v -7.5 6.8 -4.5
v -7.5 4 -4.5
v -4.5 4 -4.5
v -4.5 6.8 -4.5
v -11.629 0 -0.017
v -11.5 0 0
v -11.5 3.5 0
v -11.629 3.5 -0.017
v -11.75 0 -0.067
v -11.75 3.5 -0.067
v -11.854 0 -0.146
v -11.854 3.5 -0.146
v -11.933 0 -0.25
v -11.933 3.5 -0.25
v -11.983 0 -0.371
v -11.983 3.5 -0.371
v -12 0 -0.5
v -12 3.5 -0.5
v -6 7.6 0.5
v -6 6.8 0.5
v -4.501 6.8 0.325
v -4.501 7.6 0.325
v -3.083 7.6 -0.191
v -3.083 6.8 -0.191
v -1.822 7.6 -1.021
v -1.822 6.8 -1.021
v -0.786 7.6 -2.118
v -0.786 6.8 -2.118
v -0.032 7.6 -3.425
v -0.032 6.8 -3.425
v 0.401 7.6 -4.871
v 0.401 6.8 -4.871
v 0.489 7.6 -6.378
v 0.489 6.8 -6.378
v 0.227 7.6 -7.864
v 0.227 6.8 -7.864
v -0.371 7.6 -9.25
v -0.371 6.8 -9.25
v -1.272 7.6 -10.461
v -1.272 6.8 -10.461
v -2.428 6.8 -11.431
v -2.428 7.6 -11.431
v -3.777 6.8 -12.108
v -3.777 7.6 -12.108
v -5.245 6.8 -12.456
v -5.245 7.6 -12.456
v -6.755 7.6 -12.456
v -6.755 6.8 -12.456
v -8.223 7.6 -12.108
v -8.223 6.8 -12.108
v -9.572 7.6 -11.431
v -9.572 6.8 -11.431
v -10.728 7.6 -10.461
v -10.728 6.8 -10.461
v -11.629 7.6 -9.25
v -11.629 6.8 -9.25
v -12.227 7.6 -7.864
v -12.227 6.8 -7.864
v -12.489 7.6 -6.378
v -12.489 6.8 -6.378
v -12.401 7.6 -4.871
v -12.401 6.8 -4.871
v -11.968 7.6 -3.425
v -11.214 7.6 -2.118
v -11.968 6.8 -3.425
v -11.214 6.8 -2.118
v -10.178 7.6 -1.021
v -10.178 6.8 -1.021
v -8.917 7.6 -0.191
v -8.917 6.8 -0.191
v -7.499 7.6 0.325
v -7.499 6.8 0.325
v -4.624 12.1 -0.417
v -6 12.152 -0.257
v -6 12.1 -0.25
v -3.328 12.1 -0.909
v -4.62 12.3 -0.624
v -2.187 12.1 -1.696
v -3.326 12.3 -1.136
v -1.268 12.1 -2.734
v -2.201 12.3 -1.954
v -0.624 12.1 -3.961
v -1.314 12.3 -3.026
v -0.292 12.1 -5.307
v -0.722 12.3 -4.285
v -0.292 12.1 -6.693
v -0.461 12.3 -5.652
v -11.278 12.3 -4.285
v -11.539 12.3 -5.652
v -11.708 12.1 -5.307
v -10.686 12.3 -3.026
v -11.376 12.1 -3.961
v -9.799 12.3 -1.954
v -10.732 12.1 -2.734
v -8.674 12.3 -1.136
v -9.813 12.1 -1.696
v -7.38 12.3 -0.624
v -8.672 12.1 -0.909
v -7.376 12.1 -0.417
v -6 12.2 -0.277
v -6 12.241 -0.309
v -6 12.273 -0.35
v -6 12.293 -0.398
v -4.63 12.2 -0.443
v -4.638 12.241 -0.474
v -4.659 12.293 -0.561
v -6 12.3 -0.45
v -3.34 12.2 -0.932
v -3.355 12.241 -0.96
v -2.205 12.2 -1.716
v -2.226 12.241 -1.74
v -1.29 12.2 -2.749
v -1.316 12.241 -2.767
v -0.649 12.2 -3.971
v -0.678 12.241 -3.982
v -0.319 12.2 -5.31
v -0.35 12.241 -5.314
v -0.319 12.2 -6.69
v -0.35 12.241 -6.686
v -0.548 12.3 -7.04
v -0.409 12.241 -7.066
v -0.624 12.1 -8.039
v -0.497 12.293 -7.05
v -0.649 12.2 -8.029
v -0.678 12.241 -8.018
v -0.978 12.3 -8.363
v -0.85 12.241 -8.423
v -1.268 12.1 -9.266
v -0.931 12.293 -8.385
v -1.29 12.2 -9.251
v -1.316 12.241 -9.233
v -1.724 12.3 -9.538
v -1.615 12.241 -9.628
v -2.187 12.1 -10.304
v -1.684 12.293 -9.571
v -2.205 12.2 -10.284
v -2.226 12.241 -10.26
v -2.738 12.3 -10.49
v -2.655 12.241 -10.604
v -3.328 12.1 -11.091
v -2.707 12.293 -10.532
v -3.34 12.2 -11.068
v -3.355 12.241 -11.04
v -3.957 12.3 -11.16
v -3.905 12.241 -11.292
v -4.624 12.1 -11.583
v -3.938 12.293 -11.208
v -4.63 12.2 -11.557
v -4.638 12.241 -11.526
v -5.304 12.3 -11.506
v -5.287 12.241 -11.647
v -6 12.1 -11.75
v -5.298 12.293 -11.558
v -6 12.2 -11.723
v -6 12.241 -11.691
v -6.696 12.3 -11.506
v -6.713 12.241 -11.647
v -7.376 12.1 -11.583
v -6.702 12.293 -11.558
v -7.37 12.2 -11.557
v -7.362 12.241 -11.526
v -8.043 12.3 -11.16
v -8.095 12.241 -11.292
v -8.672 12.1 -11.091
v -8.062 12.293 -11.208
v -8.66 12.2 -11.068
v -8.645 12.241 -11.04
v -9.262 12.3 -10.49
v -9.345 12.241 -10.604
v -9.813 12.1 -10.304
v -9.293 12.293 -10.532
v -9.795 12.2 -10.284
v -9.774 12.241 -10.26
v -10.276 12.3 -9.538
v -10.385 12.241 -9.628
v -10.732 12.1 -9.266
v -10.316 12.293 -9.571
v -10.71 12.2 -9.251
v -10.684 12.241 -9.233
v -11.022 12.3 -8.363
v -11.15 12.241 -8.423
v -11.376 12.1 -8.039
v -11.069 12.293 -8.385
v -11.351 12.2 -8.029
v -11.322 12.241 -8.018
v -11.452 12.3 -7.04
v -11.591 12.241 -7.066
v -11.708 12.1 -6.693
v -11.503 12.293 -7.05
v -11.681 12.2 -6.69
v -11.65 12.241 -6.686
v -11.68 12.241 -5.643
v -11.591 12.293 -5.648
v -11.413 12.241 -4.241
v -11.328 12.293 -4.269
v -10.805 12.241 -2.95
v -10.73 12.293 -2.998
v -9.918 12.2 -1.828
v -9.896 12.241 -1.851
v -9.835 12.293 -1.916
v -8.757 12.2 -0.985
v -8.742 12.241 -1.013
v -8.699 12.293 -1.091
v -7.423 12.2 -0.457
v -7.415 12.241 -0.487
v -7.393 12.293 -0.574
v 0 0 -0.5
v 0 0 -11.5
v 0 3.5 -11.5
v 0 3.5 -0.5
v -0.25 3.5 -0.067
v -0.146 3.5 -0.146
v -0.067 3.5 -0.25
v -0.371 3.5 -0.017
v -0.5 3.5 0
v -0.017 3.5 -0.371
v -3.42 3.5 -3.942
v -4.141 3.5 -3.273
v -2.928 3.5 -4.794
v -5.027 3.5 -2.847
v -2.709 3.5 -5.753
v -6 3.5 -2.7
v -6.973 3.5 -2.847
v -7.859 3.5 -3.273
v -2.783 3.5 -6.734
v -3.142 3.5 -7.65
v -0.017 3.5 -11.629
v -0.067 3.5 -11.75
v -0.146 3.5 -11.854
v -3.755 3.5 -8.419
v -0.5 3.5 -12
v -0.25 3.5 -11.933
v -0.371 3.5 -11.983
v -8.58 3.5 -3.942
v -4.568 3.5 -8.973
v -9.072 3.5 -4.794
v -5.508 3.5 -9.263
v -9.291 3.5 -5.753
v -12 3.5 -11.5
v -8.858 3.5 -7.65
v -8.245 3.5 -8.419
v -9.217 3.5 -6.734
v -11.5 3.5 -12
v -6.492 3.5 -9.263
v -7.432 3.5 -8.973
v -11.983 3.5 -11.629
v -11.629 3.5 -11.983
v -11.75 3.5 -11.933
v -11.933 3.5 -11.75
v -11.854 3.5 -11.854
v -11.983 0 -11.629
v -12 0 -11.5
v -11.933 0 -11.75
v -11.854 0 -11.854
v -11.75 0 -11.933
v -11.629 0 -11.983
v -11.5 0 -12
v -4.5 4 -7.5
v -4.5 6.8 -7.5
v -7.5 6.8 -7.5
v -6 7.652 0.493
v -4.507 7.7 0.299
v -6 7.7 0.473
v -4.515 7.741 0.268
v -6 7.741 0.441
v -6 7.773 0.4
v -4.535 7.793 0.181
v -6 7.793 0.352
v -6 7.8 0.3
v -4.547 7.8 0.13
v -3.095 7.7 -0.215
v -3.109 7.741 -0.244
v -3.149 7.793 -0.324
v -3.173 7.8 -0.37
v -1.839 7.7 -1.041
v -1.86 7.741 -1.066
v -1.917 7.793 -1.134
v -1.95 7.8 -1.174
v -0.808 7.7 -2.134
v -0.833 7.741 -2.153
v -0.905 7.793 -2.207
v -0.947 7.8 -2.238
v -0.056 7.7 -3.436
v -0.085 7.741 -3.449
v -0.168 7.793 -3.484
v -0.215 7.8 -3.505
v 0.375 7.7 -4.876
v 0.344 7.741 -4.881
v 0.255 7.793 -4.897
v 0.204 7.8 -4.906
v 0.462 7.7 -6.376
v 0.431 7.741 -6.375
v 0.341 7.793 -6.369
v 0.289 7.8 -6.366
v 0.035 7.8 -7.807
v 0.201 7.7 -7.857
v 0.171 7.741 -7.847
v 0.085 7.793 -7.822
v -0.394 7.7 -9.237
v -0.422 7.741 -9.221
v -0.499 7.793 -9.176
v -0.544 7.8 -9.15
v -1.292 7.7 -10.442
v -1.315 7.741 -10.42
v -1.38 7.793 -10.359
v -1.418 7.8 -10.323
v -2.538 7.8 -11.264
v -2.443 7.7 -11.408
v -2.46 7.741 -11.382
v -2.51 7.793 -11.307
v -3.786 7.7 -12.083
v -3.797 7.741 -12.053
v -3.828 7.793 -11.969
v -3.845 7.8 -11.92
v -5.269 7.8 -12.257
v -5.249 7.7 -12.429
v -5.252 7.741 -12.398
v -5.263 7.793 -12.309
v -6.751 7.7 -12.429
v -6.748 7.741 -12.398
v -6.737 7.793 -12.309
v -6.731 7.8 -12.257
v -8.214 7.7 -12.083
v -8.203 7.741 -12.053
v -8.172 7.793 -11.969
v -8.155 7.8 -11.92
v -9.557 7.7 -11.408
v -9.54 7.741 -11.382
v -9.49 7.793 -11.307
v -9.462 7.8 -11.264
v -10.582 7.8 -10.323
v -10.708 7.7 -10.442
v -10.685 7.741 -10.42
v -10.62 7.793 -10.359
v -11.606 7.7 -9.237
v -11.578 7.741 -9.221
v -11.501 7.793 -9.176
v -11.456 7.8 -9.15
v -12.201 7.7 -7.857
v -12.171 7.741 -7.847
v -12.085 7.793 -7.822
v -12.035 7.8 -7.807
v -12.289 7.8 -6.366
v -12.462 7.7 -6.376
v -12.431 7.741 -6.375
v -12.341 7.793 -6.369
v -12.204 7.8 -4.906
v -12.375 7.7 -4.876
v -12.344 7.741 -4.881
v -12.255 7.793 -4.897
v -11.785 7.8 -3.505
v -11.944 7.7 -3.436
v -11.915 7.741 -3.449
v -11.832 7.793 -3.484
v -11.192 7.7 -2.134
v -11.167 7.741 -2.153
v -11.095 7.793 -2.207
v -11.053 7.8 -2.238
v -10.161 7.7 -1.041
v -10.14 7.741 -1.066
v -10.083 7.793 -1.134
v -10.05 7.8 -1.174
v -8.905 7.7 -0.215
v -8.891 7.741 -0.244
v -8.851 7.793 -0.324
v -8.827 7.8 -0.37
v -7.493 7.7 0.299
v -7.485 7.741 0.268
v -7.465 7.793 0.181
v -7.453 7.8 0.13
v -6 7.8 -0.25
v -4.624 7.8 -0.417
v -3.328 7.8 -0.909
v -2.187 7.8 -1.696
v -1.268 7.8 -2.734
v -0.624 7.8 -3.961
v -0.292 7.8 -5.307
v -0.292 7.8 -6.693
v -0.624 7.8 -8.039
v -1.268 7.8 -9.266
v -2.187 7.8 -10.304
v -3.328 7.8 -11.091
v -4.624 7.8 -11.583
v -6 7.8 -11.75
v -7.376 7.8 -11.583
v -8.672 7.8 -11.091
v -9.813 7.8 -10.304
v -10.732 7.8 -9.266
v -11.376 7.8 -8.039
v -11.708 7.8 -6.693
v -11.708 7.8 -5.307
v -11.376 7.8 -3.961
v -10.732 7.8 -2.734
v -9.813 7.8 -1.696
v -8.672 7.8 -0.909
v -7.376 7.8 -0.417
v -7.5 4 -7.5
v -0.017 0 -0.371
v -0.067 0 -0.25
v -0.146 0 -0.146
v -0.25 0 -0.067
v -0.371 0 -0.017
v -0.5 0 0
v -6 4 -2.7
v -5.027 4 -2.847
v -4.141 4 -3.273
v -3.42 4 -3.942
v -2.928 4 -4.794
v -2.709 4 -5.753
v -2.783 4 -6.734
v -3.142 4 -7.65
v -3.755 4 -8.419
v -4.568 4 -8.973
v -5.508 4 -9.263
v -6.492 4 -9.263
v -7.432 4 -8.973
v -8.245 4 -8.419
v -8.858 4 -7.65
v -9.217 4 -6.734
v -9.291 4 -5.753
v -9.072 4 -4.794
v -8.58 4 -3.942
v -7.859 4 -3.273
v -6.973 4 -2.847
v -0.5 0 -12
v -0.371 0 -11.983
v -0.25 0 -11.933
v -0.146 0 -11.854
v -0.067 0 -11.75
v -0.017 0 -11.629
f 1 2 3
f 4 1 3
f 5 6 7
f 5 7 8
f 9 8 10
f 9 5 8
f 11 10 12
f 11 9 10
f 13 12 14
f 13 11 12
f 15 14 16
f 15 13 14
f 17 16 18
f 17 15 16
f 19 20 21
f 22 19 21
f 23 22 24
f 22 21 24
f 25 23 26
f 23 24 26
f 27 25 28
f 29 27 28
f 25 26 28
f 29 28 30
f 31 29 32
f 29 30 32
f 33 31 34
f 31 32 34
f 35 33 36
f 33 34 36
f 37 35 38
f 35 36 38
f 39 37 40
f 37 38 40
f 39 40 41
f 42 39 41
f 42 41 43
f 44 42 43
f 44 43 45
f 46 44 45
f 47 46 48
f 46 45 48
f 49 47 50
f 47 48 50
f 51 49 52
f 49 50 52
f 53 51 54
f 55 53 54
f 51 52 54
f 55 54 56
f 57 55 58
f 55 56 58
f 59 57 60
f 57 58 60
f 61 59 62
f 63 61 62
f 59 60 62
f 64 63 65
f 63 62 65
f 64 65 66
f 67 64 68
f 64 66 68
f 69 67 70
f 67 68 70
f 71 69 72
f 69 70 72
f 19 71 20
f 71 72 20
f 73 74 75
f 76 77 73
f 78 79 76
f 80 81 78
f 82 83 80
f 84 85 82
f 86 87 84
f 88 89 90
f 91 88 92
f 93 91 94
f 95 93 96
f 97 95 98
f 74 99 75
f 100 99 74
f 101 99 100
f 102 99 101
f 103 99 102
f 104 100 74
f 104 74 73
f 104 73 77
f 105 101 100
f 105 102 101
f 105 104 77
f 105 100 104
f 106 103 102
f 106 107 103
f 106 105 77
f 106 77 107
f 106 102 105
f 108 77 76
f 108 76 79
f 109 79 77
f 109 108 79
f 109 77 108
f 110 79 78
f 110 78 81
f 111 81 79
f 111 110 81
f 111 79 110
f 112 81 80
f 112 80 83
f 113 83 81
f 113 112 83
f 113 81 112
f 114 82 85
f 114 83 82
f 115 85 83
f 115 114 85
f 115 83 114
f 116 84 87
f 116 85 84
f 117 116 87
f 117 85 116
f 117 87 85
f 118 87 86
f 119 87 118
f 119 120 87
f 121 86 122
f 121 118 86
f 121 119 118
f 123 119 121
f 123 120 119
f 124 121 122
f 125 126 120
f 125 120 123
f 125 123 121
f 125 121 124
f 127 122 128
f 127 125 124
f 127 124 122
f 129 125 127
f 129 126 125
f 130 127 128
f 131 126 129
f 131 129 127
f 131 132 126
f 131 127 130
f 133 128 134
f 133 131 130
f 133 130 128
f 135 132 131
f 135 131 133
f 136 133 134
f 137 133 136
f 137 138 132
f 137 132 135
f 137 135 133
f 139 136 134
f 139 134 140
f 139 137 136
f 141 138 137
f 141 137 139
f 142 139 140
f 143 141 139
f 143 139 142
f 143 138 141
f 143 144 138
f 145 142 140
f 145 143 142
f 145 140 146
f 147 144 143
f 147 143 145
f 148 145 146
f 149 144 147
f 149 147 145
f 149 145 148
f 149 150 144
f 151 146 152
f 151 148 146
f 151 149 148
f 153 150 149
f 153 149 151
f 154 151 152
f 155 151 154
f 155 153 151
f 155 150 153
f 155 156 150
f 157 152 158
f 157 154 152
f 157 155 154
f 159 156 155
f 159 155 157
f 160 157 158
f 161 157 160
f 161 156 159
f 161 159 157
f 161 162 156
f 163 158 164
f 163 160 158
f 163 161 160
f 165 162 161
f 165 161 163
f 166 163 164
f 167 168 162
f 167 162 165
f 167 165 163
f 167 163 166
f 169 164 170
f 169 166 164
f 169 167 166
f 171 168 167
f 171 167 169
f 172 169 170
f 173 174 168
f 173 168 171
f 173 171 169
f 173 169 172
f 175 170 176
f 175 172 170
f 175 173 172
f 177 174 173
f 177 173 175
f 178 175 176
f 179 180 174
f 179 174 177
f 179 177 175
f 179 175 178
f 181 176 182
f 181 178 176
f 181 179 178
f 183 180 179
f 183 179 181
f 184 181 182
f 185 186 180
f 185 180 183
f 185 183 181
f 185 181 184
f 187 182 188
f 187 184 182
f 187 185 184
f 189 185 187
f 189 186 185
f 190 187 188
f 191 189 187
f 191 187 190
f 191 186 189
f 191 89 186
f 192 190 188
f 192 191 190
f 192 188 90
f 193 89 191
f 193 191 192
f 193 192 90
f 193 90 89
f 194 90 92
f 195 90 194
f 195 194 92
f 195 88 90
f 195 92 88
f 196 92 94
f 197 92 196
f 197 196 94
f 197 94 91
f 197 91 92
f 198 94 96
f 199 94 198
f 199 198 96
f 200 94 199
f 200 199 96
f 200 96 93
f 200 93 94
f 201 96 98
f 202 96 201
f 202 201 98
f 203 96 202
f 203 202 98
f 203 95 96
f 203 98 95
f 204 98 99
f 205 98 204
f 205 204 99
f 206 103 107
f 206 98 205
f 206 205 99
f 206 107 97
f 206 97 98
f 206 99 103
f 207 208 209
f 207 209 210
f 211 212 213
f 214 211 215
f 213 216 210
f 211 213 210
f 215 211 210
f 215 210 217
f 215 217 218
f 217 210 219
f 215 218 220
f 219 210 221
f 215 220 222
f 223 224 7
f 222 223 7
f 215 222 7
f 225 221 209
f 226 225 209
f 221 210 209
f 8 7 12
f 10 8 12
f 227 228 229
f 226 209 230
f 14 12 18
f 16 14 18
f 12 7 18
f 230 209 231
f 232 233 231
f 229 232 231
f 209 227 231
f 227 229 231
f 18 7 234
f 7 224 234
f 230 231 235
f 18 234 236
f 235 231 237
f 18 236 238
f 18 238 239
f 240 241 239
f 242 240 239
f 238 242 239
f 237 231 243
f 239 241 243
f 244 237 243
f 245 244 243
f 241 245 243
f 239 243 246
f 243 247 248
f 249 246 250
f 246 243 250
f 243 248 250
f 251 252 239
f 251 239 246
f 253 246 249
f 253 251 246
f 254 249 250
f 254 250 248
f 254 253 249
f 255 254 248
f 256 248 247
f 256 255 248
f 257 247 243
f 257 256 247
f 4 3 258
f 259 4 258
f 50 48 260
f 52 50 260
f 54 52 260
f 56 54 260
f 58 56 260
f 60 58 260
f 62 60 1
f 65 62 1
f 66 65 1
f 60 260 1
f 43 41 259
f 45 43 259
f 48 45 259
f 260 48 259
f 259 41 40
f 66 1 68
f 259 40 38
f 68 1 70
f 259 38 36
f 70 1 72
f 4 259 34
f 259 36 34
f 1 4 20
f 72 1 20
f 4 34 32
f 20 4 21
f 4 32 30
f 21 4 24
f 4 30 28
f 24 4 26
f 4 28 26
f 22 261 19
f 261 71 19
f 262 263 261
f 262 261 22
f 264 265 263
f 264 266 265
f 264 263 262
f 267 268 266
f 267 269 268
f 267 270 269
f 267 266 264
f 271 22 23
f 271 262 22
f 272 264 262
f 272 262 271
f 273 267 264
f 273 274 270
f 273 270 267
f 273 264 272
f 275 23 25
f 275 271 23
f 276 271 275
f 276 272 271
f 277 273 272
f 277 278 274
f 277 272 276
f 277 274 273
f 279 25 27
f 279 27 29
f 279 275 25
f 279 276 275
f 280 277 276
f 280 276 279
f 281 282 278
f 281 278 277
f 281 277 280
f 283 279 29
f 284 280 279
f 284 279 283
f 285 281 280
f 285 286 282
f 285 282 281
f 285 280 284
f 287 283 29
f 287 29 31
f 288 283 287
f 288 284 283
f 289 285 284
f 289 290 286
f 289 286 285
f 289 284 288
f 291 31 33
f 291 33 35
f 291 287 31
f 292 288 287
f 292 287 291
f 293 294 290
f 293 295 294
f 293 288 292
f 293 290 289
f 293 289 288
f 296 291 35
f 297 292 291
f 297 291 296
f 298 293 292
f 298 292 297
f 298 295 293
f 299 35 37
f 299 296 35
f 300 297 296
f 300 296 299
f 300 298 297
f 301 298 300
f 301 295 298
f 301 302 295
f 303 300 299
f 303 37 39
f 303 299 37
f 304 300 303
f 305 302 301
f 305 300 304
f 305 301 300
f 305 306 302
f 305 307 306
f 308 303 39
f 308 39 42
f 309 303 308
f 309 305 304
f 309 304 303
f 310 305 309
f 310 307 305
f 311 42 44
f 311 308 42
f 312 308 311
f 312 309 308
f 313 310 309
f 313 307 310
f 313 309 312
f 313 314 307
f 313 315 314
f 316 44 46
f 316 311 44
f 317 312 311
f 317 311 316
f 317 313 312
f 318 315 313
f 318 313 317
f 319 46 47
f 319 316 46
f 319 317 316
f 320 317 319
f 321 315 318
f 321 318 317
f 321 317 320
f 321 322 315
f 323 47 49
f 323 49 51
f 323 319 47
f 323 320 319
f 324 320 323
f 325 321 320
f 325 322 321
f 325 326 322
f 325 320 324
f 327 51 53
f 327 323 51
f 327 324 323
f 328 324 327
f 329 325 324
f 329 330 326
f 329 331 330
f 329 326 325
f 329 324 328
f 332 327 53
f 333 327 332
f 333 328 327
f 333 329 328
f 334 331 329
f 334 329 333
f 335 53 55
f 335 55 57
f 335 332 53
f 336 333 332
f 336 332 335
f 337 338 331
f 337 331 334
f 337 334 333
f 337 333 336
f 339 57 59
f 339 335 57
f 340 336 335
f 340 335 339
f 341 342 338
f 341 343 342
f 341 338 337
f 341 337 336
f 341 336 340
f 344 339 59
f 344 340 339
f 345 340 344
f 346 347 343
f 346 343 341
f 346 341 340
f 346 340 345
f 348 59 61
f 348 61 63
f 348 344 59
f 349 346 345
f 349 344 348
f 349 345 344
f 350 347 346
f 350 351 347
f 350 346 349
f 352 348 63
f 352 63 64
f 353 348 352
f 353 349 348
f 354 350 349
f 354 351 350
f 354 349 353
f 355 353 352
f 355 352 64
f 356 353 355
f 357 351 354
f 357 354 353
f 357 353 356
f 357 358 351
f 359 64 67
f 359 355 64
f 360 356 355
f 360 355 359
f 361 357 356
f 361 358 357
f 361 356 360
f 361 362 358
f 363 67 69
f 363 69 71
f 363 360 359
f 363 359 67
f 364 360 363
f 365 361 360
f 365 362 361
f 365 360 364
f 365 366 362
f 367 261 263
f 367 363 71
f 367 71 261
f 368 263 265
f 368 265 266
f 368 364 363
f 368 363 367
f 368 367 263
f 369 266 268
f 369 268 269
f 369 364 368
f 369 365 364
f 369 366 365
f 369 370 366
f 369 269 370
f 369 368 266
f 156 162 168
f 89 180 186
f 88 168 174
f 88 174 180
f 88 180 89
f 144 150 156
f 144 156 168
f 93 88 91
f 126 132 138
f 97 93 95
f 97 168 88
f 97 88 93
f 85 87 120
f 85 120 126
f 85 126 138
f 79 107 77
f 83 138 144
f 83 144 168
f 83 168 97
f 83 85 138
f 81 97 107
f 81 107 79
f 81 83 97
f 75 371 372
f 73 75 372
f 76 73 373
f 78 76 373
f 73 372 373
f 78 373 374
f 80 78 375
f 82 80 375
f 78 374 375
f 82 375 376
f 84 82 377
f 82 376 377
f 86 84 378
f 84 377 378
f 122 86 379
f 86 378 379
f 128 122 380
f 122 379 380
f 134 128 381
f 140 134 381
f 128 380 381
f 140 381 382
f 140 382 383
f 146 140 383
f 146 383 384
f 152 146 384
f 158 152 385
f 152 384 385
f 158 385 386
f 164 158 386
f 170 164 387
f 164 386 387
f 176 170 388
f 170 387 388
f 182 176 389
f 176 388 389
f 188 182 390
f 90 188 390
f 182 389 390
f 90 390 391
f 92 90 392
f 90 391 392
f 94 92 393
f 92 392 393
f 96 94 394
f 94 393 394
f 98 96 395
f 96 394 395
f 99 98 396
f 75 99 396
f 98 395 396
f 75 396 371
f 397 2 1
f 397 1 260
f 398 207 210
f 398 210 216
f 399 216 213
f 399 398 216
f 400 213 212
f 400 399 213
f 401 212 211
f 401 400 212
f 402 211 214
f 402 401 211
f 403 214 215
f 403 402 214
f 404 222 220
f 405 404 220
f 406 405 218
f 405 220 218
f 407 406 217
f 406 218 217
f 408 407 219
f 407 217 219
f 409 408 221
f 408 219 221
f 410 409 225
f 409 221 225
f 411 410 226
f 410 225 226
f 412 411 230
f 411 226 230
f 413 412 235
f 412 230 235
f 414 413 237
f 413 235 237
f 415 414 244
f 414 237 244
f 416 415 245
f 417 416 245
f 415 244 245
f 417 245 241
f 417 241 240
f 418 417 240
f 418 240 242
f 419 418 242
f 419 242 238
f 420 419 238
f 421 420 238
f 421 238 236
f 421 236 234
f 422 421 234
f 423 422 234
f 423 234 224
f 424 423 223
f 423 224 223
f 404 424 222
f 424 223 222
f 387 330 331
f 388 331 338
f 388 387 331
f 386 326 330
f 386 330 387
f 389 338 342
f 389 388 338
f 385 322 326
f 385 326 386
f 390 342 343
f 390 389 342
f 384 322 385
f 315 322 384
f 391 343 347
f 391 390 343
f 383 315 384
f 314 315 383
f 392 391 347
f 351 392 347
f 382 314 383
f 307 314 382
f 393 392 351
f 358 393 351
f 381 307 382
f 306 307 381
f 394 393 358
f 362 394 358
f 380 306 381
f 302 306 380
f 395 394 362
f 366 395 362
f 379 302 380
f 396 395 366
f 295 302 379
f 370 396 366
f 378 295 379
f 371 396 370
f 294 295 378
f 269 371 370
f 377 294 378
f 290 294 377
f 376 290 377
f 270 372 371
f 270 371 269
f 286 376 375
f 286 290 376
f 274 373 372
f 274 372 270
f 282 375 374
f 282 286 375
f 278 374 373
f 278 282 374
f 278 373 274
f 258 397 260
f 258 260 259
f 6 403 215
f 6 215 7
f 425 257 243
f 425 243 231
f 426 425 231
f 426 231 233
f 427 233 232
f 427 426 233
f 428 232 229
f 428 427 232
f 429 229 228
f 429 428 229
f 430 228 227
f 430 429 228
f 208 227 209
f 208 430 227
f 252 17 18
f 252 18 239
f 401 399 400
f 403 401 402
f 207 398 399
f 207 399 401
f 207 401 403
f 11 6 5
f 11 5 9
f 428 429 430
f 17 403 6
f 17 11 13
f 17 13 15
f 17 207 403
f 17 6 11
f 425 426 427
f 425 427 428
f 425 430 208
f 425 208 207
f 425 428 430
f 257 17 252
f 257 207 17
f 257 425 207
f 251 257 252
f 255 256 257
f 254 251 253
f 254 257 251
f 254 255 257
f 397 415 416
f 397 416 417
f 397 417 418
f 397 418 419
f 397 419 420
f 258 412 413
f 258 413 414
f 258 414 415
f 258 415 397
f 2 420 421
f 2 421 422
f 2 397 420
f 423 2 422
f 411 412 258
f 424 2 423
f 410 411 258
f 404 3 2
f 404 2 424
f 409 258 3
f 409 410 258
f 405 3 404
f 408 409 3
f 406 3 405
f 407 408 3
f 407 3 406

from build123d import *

# Parameters (mm, degrees)
BOSS_EXTRUDE1_DEPTH = 3.5
SKETCH2_R           = 3.3
BOSS_EXTRUDE2_DEPTH = 0.5
SKETCH3_W           = 3
SKETCH3_H           = 3
BOSS_EXTRUDE3_DEPTH = 2.8
SKETCH4_R           = 6.5
BOSS_EXTRUDE4_DEPTH = 1
SKETCH5_R           = 5.75
BOSS_EXTRUDE5_DEPTH = 4.5
FILLET1_R           = 0.2


with BuildPart() as part:
    # Sketch1 → Boss-Extrude1 (new body)
    with BuildSketch(Plane(origin=(0, 0, 0), x_dir=(1, 0, 0), z_dir=(0, 1, 0))):
        with BuildLine():
            Line((-0.5, 0), (-11.5, 0))
            ThreePointArc((-11.5, 0), (-11.853553391, 0.146446609), (-12, 0.5))
            Line((-12, 0.5), (-12, 11.5))
            ThreePointArc((-12, 11.5), (-11.853553391, 11.853553391), (-11.5, 12))
            Line((-11.5, 12), (-0.5, 12))
            ThreePointArc((-0.5, 12), (-0.146446609, 11.853553391), (0, 11.5))
            Line((0, 11.5), (0, 0.5))
            ThreePointArc((0, 0.5), (-0.146446609, 0.146446609), (-0.5, 0))
        make_face()
    extrude(amount=BOSS_EXTRUDE1_DEPTH)

    # Sketch2 → Boss-Extrude2 (add)
    with BuildSketch(Plane(origin=(0, 3.5, 0), x_dir=(1, 0, 0), z_dir=(0, 1, 0))):
        with Locations(Location((-6, 6, 0), (0, 0, 270))):
            Circle(SKETCH2_R)
    extrude(amount=BOSS_EXTRUDE2_DEPTH)

    # Sketch3 → Boss-Extrude3 (add)
    with BuildSketch(Plane(origin=(0, 4, 0), x_dir=(1, 0, 0), z_dir=(0, 1, 0))):
        with Locations((-6, 6)):
            Rectangle(SKETCH3_W, SKETCH3_H)
    extrude(amount=BOSS_EXTRUDE3_DEPTH)

    # Sketch4 → Boss-Extrude4 (add)
    with BuildSketch(Plane(origin=(0, 6.8, 0), x_dir=(1, 0, 0), z_dir=(0, 1, 0))):
        with Locations(Location((-6, 6, 0), (0, 0, 270))):
            Circle(SKETCH4_R)
    extrude(amount=BOSS_EXTRUDE4_DEPTH)

    # Sketch5 → Boss-Extrude5 (add)
    with BuildSketch(Plane(origin=(0, 7.8, 0), x_dir=(1, 0, 0), z_dir=(0, 1, 0))):
        with Locations(Location((-6, 6, 0), (0, 0, 270))):
            Circle(SKETCH5_R)
    extrude(amount=BOSS_EXTRUDE5_DEPTH)

    # Fillet1
    fillet1_edges = [part.edges().sort_by_distance(p)[0] for p in [
        (-6, 7.8, -12.5),
        (-6, 12.3, -11.75),
    ]]
    fillet(fillet1_edges, radius=FILLET1_R)


solid = part.part
